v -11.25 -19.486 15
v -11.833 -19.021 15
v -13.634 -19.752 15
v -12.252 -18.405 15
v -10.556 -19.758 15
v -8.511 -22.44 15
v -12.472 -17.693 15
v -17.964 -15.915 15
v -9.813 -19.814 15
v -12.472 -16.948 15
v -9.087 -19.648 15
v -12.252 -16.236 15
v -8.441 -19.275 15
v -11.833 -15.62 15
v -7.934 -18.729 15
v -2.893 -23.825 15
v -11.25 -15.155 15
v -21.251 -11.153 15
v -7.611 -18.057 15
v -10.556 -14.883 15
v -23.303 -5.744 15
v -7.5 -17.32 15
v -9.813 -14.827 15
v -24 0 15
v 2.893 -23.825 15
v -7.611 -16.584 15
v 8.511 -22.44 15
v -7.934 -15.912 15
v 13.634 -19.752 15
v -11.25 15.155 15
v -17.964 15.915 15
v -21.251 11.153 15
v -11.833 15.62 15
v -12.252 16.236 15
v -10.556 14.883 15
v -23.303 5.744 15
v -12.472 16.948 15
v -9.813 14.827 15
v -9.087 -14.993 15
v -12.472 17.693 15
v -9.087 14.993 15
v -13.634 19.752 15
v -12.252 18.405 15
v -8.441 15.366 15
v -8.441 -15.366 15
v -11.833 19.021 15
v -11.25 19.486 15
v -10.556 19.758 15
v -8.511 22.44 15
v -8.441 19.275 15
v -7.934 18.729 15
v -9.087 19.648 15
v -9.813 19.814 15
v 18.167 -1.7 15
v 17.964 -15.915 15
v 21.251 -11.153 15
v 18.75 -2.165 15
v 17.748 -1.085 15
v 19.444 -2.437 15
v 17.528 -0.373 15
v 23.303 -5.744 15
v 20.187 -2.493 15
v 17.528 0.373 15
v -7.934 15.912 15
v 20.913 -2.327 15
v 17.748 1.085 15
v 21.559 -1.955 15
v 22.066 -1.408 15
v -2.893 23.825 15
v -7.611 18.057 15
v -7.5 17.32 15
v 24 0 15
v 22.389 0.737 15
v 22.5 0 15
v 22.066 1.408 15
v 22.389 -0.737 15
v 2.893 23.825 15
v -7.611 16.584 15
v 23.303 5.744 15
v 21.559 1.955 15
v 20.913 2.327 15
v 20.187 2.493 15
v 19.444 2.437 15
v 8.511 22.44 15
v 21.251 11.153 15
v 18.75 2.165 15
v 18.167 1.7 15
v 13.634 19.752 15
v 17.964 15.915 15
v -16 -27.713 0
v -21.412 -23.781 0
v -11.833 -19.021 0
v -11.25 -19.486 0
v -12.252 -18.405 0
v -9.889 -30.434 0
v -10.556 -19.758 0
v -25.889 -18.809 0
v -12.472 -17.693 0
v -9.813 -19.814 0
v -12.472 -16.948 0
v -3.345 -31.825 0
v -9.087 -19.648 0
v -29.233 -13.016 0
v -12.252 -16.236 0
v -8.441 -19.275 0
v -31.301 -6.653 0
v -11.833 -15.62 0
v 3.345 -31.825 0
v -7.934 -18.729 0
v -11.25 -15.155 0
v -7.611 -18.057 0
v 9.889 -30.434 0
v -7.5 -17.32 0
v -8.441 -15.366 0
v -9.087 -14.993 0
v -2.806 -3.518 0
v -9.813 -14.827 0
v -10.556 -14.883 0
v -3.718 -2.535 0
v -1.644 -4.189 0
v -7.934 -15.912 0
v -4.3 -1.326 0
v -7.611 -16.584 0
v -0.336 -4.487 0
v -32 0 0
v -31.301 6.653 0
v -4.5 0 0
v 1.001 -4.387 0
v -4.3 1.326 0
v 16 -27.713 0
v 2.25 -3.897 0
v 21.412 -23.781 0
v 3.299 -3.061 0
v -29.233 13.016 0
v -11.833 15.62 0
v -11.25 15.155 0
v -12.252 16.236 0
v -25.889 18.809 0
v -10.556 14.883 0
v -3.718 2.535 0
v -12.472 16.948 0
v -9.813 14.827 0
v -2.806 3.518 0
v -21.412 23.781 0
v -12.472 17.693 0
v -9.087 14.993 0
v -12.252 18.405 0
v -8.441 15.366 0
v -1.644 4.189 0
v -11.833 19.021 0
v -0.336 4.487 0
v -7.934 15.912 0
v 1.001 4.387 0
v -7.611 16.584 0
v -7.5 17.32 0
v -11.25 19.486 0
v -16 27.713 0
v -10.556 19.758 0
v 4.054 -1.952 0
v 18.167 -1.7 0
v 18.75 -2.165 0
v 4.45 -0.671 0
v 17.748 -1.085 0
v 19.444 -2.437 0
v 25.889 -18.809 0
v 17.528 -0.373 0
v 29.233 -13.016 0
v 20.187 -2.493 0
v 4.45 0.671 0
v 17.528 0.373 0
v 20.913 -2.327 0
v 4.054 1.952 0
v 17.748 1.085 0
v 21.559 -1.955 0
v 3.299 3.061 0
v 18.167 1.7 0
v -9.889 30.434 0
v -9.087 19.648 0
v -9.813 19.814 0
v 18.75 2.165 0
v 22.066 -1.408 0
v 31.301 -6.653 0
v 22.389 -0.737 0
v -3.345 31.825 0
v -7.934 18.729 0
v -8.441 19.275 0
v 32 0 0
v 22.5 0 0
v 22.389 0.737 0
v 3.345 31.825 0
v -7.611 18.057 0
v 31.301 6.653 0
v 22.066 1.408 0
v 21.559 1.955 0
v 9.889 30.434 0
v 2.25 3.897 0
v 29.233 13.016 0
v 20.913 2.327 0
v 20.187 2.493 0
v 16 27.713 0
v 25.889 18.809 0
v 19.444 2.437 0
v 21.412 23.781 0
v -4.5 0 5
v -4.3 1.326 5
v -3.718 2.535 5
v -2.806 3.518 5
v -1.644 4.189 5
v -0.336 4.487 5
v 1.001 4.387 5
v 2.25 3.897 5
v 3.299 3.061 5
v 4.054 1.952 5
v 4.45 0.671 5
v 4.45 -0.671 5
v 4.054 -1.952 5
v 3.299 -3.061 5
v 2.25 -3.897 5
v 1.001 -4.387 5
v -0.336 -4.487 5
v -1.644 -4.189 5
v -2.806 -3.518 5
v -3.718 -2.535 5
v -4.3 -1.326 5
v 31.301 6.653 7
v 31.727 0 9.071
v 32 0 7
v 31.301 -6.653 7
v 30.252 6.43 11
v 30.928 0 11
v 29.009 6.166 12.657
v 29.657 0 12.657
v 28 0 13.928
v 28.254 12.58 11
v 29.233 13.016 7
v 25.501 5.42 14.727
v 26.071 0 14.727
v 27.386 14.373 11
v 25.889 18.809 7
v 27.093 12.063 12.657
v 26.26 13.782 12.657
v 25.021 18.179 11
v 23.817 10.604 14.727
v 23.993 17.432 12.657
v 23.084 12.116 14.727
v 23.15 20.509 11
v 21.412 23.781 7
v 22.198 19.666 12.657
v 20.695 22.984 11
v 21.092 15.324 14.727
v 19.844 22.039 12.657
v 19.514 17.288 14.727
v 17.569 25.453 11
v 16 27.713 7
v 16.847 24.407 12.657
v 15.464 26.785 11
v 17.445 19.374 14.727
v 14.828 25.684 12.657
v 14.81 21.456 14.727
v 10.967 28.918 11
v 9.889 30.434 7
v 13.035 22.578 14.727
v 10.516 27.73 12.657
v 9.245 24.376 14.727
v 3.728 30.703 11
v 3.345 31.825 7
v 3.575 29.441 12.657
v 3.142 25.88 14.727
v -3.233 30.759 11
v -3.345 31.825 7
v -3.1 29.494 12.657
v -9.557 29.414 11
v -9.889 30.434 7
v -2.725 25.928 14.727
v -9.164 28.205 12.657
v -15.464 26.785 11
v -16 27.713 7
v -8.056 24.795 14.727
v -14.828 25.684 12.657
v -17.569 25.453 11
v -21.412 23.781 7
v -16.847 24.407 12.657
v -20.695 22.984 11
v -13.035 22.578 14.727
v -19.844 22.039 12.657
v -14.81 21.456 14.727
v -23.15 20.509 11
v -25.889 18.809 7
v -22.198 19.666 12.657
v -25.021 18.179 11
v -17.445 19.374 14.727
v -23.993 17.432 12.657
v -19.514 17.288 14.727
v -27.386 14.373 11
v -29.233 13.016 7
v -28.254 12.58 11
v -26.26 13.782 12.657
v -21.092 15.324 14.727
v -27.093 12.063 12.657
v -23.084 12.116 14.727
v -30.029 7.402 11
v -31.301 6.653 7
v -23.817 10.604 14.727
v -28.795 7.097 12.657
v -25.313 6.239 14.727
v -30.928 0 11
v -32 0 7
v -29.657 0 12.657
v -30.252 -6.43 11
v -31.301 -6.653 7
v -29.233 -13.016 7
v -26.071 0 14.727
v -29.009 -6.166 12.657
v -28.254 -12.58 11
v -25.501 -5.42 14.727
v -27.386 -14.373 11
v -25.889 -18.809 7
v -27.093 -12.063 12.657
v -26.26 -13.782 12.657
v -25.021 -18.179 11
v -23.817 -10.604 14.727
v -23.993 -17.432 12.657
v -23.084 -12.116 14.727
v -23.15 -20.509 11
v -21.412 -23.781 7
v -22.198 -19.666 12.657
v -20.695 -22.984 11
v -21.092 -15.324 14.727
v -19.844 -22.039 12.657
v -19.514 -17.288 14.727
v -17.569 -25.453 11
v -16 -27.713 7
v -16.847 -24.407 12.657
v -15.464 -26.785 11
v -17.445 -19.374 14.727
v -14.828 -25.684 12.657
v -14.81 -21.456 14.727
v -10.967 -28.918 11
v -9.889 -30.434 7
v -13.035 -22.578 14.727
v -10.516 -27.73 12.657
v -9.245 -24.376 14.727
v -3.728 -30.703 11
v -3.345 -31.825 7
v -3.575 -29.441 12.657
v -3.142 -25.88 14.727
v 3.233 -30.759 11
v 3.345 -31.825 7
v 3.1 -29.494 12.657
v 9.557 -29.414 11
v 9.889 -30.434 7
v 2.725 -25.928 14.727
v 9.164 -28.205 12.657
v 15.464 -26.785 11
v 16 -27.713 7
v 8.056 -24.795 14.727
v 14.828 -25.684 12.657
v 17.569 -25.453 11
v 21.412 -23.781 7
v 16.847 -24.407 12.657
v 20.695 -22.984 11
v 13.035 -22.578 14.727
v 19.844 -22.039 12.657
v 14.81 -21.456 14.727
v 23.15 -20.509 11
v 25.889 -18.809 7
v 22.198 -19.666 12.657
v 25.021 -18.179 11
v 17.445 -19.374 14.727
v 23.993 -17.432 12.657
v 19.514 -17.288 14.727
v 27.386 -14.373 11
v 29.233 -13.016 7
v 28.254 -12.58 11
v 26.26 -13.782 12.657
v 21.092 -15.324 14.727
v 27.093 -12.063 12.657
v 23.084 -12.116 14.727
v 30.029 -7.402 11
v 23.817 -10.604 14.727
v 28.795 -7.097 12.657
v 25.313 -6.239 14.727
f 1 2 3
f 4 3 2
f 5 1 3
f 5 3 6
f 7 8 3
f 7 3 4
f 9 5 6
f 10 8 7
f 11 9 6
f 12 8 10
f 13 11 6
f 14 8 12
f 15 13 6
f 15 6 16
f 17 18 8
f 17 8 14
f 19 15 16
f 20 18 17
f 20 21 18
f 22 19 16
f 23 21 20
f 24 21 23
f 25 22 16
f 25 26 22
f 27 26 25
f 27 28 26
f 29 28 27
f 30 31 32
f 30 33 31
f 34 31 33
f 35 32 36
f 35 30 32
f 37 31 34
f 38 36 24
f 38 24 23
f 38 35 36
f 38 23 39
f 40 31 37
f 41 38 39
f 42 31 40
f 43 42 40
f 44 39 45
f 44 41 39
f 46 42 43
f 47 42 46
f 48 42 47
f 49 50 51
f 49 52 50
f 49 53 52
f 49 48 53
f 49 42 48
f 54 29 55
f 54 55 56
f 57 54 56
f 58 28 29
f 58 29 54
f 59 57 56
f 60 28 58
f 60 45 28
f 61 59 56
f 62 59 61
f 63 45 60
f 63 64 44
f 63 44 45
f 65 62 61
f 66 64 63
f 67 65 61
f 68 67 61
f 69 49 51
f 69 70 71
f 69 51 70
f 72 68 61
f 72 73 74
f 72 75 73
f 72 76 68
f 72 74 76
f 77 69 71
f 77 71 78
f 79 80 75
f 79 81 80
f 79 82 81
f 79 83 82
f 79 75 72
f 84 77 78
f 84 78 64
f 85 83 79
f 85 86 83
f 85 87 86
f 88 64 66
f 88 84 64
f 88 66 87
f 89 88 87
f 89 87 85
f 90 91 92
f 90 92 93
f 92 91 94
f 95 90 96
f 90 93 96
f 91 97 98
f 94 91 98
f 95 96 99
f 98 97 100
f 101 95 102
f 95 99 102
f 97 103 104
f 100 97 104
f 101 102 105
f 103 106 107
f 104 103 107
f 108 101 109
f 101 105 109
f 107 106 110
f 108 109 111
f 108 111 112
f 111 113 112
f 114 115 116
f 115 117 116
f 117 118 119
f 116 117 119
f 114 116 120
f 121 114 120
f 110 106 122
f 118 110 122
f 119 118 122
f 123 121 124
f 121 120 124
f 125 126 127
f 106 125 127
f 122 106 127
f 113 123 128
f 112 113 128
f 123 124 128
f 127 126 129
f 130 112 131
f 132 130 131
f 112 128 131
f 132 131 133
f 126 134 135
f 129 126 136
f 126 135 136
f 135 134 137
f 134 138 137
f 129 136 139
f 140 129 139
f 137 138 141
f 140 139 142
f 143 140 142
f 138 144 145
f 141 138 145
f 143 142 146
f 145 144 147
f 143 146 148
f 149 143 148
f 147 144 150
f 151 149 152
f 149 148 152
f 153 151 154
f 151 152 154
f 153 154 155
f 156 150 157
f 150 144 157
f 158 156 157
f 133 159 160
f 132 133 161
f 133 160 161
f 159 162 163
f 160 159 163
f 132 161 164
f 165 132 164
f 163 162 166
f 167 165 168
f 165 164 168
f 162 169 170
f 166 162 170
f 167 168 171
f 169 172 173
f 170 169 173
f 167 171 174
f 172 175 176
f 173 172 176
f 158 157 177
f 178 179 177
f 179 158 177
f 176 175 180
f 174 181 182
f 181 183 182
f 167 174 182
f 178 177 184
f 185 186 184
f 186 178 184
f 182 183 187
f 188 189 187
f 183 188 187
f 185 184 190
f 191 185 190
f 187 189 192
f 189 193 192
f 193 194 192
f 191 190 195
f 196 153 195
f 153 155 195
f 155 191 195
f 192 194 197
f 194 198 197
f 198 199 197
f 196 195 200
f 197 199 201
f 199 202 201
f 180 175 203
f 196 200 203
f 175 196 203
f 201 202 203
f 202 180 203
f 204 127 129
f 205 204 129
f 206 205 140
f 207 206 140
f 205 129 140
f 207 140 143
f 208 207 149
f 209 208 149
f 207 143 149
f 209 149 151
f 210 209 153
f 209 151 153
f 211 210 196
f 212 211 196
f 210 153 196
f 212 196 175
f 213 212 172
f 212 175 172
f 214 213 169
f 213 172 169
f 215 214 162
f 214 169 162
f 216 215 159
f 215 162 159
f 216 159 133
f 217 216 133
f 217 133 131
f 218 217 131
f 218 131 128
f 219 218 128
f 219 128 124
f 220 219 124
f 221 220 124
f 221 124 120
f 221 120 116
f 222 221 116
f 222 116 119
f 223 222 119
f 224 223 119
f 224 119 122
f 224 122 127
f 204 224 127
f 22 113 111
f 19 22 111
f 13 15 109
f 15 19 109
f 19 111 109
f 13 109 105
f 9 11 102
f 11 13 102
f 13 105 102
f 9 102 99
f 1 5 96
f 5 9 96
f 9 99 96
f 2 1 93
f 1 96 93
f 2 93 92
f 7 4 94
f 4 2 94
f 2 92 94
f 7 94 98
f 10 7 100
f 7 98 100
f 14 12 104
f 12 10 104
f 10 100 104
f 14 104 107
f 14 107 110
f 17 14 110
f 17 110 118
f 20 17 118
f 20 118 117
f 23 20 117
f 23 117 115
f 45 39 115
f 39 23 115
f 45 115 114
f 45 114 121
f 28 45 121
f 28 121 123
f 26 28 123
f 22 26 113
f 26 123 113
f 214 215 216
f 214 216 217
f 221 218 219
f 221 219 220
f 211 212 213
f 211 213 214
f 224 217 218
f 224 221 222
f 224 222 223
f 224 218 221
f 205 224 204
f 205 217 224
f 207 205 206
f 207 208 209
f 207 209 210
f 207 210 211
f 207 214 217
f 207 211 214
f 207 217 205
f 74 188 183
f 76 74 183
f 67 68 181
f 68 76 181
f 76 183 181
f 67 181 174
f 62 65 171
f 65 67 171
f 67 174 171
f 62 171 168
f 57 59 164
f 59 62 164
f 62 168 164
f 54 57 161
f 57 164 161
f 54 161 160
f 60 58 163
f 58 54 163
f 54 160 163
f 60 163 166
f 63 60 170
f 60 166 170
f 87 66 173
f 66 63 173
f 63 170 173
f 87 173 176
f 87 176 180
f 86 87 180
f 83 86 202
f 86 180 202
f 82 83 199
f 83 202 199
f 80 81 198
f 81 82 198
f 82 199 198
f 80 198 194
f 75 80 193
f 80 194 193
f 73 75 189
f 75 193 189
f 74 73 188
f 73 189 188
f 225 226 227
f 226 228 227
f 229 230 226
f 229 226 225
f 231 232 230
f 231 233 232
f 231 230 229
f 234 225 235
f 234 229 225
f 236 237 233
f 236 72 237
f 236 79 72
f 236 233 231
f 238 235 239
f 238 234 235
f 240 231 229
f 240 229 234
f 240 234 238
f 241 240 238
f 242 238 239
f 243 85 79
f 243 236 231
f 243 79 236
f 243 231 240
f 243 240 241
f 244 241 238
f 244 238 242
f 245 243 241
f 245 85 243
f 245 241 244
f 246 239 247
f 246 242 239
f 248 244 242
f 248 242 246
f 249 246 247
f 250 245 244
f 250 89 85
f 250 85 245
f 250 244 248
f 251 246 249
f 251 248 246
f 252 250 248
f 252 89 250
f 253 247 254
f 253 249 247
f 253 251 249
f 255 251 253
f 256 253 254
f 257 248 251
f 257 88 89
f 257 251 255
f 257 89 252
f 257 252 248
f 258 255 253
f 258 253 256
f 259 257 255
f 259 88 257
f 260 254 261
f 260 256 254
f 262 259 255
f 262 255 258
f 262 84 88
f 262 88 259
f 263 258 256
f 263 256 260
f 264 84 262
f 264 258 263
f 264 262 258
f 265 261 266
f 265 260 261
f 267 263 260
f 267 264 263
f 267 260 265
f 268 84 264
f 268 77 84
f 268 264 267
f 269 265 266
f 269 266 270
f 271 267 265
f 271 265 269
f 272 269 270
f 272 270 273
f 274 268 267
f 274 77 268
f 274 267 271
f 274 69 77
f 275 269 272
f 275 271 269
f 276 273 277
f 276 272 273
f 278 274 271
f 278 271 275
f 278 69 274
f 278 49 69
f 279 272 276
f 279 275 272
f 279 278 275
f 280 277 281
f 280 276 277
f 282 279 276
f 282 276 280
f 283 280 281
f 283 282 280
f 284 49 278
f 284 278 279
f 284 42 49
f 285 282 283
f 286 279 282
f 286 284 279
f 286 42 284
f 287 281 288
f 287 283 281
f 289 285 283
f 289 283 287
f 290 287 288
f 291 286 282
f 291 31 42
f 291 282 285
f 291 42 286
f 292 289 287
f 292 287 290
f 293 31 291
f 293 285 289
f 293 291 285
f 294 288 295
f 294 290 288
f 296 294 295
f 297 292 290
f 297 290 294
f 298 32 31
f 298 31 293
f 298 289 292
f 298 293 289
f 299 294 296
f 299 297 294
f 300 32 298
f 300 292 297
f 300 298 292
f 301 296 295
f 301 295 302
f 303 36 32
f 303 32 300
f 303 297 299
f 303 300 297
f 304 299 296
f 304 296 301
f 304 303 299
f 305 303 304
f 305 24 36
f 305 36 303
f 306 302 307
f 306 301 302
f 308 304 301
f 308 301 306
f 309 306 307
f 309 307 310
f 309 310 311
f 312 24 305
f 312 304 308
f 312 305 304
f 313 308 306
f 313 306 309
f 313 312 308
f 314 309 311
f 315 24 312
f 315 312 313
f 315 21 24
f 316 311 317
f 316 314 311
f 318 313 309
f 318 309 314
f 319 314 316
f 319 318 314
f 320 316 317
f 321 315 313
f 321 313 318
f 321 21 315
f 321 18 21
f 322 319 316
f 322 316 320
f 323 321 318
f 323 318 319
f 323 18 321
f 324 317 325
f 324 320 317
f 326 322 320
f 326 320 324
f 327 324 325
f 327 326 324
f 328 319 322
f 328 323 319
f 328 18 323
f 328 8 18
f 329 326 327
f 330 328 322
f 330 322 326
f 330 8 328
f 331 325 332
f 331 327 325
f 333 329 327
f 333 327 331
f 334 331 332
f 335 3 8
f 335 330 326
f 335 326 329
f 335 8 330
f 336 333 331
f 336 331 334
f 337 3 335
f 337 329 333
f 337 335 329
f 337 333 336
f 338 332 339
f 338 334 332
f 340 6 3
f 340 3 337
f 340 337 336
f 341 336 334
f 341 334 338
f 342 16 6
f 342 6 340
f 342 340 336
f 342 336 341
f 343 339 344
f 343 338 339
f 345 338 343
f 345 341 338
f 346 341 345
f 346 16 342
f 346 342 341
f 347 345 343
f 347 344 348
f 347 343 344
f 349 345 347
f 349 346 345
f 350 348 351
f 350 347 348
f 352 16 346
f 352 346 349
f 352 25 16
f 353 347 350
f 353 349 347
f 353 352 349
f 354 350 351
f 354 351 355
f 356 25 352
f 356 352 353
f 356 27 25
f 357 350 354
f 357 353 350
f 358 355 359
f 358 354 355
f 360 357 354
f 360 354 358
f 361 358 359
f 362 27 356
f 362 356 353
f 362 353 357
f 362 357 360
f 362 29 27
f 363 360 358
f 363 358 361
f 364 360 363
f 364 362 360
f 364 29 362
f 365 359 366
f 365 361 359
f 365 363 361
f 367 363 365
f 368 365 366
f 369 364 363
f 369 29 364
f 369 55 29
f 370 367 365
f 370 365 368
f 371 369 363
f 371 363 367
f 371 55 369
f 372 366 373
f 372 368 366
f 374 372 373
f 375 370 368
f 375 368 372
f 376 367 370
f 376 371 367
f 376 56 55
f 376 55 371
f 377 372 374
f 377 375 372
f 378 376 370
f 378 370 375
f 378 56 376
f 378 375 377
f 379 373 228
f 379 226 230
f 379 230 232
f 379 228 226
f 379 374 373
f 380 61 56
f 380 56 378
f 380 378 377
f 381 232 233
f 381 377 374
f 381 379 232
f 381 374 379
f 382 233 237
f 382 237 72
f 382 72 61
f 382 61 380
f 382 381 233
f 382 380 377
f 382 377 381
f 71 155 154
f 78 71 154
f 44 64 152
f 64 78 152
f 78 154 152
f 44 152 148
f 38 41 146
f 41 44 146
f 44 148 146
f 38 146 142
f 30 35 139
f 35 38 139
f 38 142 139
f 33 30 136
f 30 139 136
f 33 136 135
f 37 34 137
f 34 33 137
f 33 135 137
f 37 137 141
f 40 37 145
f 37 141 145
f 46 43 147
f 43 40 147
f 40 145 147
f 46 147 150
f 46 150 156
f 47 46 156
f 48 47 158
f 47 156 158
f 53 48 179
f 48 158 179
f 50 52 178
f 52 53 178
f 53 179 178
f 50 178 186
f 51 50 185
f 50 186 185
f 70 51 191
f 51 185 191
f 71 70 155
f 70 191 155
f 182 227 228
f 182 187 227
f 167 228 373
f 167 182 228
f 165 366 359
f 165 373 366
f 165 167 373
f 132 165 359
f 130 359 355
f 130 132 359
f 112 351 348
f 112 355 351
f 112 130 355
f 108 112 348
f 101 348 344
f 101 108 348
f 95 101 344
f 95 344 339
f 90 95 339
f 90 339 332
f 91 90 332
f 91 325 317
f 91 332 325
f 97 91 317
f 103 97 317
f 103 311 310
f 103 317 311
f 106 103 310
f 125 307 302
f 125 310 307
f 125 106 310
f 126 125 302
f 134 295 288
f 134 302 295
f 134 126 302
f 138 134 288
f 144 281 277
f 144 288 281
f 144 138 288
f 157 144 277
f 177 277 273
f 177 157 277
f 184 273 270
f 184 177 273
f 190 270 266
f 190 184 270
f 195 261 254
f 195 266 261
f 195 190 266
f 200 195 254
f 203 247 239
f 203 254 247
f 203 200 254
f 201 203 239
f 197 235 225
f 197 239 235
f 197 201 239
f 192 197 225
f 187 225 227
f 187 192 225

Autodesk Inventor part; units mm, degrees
ref_plane "YZ Plane" through (0, 0, 0) normal (1, 0, 0) x (0, 1, 0)
ref_plane "XZ Plane" through (0, 0, 0) normal (0, 1, 0) x (-1, 0, 0)
ref_plane "XY Plane" through (0, 0, 0) normal (0, 0, 1) x (1, 0, 0)
sketch "Sketch1" plane through (0, 0, 0) normal (0, 0, 1) x (1, 0, 0)
  circle A0 centre (0, 0) radius 32
  circle A1 centre (20, 0) radius 2.5
  circle A2 centre (-10, 17.3205) radius 2.5
  circle A3 centre (-10, -17.3205) radius 2.5
  dimension "d0" = 64
  dimension "d1" = 5
  dimension "d2" = 20
  dimension "d5" = 360
extrude "Extrusion1" add sketch "Sketch1" along normal blind 15
sketch "Sketch2" plane through (0, 0, 0) normal (0, 0, -1) x (-1, 0, 0)
  circle A0 centre (0, 0) radius 4.5
  dimension "d9" = 9
extrude "Extrusion2" cut sketch "Sketch2" against normal blind 5
fillet "Fillet1" radius 8 1 edges at (-32, 0, 15)
properties part number "AA013" material "ABS Plastic"
